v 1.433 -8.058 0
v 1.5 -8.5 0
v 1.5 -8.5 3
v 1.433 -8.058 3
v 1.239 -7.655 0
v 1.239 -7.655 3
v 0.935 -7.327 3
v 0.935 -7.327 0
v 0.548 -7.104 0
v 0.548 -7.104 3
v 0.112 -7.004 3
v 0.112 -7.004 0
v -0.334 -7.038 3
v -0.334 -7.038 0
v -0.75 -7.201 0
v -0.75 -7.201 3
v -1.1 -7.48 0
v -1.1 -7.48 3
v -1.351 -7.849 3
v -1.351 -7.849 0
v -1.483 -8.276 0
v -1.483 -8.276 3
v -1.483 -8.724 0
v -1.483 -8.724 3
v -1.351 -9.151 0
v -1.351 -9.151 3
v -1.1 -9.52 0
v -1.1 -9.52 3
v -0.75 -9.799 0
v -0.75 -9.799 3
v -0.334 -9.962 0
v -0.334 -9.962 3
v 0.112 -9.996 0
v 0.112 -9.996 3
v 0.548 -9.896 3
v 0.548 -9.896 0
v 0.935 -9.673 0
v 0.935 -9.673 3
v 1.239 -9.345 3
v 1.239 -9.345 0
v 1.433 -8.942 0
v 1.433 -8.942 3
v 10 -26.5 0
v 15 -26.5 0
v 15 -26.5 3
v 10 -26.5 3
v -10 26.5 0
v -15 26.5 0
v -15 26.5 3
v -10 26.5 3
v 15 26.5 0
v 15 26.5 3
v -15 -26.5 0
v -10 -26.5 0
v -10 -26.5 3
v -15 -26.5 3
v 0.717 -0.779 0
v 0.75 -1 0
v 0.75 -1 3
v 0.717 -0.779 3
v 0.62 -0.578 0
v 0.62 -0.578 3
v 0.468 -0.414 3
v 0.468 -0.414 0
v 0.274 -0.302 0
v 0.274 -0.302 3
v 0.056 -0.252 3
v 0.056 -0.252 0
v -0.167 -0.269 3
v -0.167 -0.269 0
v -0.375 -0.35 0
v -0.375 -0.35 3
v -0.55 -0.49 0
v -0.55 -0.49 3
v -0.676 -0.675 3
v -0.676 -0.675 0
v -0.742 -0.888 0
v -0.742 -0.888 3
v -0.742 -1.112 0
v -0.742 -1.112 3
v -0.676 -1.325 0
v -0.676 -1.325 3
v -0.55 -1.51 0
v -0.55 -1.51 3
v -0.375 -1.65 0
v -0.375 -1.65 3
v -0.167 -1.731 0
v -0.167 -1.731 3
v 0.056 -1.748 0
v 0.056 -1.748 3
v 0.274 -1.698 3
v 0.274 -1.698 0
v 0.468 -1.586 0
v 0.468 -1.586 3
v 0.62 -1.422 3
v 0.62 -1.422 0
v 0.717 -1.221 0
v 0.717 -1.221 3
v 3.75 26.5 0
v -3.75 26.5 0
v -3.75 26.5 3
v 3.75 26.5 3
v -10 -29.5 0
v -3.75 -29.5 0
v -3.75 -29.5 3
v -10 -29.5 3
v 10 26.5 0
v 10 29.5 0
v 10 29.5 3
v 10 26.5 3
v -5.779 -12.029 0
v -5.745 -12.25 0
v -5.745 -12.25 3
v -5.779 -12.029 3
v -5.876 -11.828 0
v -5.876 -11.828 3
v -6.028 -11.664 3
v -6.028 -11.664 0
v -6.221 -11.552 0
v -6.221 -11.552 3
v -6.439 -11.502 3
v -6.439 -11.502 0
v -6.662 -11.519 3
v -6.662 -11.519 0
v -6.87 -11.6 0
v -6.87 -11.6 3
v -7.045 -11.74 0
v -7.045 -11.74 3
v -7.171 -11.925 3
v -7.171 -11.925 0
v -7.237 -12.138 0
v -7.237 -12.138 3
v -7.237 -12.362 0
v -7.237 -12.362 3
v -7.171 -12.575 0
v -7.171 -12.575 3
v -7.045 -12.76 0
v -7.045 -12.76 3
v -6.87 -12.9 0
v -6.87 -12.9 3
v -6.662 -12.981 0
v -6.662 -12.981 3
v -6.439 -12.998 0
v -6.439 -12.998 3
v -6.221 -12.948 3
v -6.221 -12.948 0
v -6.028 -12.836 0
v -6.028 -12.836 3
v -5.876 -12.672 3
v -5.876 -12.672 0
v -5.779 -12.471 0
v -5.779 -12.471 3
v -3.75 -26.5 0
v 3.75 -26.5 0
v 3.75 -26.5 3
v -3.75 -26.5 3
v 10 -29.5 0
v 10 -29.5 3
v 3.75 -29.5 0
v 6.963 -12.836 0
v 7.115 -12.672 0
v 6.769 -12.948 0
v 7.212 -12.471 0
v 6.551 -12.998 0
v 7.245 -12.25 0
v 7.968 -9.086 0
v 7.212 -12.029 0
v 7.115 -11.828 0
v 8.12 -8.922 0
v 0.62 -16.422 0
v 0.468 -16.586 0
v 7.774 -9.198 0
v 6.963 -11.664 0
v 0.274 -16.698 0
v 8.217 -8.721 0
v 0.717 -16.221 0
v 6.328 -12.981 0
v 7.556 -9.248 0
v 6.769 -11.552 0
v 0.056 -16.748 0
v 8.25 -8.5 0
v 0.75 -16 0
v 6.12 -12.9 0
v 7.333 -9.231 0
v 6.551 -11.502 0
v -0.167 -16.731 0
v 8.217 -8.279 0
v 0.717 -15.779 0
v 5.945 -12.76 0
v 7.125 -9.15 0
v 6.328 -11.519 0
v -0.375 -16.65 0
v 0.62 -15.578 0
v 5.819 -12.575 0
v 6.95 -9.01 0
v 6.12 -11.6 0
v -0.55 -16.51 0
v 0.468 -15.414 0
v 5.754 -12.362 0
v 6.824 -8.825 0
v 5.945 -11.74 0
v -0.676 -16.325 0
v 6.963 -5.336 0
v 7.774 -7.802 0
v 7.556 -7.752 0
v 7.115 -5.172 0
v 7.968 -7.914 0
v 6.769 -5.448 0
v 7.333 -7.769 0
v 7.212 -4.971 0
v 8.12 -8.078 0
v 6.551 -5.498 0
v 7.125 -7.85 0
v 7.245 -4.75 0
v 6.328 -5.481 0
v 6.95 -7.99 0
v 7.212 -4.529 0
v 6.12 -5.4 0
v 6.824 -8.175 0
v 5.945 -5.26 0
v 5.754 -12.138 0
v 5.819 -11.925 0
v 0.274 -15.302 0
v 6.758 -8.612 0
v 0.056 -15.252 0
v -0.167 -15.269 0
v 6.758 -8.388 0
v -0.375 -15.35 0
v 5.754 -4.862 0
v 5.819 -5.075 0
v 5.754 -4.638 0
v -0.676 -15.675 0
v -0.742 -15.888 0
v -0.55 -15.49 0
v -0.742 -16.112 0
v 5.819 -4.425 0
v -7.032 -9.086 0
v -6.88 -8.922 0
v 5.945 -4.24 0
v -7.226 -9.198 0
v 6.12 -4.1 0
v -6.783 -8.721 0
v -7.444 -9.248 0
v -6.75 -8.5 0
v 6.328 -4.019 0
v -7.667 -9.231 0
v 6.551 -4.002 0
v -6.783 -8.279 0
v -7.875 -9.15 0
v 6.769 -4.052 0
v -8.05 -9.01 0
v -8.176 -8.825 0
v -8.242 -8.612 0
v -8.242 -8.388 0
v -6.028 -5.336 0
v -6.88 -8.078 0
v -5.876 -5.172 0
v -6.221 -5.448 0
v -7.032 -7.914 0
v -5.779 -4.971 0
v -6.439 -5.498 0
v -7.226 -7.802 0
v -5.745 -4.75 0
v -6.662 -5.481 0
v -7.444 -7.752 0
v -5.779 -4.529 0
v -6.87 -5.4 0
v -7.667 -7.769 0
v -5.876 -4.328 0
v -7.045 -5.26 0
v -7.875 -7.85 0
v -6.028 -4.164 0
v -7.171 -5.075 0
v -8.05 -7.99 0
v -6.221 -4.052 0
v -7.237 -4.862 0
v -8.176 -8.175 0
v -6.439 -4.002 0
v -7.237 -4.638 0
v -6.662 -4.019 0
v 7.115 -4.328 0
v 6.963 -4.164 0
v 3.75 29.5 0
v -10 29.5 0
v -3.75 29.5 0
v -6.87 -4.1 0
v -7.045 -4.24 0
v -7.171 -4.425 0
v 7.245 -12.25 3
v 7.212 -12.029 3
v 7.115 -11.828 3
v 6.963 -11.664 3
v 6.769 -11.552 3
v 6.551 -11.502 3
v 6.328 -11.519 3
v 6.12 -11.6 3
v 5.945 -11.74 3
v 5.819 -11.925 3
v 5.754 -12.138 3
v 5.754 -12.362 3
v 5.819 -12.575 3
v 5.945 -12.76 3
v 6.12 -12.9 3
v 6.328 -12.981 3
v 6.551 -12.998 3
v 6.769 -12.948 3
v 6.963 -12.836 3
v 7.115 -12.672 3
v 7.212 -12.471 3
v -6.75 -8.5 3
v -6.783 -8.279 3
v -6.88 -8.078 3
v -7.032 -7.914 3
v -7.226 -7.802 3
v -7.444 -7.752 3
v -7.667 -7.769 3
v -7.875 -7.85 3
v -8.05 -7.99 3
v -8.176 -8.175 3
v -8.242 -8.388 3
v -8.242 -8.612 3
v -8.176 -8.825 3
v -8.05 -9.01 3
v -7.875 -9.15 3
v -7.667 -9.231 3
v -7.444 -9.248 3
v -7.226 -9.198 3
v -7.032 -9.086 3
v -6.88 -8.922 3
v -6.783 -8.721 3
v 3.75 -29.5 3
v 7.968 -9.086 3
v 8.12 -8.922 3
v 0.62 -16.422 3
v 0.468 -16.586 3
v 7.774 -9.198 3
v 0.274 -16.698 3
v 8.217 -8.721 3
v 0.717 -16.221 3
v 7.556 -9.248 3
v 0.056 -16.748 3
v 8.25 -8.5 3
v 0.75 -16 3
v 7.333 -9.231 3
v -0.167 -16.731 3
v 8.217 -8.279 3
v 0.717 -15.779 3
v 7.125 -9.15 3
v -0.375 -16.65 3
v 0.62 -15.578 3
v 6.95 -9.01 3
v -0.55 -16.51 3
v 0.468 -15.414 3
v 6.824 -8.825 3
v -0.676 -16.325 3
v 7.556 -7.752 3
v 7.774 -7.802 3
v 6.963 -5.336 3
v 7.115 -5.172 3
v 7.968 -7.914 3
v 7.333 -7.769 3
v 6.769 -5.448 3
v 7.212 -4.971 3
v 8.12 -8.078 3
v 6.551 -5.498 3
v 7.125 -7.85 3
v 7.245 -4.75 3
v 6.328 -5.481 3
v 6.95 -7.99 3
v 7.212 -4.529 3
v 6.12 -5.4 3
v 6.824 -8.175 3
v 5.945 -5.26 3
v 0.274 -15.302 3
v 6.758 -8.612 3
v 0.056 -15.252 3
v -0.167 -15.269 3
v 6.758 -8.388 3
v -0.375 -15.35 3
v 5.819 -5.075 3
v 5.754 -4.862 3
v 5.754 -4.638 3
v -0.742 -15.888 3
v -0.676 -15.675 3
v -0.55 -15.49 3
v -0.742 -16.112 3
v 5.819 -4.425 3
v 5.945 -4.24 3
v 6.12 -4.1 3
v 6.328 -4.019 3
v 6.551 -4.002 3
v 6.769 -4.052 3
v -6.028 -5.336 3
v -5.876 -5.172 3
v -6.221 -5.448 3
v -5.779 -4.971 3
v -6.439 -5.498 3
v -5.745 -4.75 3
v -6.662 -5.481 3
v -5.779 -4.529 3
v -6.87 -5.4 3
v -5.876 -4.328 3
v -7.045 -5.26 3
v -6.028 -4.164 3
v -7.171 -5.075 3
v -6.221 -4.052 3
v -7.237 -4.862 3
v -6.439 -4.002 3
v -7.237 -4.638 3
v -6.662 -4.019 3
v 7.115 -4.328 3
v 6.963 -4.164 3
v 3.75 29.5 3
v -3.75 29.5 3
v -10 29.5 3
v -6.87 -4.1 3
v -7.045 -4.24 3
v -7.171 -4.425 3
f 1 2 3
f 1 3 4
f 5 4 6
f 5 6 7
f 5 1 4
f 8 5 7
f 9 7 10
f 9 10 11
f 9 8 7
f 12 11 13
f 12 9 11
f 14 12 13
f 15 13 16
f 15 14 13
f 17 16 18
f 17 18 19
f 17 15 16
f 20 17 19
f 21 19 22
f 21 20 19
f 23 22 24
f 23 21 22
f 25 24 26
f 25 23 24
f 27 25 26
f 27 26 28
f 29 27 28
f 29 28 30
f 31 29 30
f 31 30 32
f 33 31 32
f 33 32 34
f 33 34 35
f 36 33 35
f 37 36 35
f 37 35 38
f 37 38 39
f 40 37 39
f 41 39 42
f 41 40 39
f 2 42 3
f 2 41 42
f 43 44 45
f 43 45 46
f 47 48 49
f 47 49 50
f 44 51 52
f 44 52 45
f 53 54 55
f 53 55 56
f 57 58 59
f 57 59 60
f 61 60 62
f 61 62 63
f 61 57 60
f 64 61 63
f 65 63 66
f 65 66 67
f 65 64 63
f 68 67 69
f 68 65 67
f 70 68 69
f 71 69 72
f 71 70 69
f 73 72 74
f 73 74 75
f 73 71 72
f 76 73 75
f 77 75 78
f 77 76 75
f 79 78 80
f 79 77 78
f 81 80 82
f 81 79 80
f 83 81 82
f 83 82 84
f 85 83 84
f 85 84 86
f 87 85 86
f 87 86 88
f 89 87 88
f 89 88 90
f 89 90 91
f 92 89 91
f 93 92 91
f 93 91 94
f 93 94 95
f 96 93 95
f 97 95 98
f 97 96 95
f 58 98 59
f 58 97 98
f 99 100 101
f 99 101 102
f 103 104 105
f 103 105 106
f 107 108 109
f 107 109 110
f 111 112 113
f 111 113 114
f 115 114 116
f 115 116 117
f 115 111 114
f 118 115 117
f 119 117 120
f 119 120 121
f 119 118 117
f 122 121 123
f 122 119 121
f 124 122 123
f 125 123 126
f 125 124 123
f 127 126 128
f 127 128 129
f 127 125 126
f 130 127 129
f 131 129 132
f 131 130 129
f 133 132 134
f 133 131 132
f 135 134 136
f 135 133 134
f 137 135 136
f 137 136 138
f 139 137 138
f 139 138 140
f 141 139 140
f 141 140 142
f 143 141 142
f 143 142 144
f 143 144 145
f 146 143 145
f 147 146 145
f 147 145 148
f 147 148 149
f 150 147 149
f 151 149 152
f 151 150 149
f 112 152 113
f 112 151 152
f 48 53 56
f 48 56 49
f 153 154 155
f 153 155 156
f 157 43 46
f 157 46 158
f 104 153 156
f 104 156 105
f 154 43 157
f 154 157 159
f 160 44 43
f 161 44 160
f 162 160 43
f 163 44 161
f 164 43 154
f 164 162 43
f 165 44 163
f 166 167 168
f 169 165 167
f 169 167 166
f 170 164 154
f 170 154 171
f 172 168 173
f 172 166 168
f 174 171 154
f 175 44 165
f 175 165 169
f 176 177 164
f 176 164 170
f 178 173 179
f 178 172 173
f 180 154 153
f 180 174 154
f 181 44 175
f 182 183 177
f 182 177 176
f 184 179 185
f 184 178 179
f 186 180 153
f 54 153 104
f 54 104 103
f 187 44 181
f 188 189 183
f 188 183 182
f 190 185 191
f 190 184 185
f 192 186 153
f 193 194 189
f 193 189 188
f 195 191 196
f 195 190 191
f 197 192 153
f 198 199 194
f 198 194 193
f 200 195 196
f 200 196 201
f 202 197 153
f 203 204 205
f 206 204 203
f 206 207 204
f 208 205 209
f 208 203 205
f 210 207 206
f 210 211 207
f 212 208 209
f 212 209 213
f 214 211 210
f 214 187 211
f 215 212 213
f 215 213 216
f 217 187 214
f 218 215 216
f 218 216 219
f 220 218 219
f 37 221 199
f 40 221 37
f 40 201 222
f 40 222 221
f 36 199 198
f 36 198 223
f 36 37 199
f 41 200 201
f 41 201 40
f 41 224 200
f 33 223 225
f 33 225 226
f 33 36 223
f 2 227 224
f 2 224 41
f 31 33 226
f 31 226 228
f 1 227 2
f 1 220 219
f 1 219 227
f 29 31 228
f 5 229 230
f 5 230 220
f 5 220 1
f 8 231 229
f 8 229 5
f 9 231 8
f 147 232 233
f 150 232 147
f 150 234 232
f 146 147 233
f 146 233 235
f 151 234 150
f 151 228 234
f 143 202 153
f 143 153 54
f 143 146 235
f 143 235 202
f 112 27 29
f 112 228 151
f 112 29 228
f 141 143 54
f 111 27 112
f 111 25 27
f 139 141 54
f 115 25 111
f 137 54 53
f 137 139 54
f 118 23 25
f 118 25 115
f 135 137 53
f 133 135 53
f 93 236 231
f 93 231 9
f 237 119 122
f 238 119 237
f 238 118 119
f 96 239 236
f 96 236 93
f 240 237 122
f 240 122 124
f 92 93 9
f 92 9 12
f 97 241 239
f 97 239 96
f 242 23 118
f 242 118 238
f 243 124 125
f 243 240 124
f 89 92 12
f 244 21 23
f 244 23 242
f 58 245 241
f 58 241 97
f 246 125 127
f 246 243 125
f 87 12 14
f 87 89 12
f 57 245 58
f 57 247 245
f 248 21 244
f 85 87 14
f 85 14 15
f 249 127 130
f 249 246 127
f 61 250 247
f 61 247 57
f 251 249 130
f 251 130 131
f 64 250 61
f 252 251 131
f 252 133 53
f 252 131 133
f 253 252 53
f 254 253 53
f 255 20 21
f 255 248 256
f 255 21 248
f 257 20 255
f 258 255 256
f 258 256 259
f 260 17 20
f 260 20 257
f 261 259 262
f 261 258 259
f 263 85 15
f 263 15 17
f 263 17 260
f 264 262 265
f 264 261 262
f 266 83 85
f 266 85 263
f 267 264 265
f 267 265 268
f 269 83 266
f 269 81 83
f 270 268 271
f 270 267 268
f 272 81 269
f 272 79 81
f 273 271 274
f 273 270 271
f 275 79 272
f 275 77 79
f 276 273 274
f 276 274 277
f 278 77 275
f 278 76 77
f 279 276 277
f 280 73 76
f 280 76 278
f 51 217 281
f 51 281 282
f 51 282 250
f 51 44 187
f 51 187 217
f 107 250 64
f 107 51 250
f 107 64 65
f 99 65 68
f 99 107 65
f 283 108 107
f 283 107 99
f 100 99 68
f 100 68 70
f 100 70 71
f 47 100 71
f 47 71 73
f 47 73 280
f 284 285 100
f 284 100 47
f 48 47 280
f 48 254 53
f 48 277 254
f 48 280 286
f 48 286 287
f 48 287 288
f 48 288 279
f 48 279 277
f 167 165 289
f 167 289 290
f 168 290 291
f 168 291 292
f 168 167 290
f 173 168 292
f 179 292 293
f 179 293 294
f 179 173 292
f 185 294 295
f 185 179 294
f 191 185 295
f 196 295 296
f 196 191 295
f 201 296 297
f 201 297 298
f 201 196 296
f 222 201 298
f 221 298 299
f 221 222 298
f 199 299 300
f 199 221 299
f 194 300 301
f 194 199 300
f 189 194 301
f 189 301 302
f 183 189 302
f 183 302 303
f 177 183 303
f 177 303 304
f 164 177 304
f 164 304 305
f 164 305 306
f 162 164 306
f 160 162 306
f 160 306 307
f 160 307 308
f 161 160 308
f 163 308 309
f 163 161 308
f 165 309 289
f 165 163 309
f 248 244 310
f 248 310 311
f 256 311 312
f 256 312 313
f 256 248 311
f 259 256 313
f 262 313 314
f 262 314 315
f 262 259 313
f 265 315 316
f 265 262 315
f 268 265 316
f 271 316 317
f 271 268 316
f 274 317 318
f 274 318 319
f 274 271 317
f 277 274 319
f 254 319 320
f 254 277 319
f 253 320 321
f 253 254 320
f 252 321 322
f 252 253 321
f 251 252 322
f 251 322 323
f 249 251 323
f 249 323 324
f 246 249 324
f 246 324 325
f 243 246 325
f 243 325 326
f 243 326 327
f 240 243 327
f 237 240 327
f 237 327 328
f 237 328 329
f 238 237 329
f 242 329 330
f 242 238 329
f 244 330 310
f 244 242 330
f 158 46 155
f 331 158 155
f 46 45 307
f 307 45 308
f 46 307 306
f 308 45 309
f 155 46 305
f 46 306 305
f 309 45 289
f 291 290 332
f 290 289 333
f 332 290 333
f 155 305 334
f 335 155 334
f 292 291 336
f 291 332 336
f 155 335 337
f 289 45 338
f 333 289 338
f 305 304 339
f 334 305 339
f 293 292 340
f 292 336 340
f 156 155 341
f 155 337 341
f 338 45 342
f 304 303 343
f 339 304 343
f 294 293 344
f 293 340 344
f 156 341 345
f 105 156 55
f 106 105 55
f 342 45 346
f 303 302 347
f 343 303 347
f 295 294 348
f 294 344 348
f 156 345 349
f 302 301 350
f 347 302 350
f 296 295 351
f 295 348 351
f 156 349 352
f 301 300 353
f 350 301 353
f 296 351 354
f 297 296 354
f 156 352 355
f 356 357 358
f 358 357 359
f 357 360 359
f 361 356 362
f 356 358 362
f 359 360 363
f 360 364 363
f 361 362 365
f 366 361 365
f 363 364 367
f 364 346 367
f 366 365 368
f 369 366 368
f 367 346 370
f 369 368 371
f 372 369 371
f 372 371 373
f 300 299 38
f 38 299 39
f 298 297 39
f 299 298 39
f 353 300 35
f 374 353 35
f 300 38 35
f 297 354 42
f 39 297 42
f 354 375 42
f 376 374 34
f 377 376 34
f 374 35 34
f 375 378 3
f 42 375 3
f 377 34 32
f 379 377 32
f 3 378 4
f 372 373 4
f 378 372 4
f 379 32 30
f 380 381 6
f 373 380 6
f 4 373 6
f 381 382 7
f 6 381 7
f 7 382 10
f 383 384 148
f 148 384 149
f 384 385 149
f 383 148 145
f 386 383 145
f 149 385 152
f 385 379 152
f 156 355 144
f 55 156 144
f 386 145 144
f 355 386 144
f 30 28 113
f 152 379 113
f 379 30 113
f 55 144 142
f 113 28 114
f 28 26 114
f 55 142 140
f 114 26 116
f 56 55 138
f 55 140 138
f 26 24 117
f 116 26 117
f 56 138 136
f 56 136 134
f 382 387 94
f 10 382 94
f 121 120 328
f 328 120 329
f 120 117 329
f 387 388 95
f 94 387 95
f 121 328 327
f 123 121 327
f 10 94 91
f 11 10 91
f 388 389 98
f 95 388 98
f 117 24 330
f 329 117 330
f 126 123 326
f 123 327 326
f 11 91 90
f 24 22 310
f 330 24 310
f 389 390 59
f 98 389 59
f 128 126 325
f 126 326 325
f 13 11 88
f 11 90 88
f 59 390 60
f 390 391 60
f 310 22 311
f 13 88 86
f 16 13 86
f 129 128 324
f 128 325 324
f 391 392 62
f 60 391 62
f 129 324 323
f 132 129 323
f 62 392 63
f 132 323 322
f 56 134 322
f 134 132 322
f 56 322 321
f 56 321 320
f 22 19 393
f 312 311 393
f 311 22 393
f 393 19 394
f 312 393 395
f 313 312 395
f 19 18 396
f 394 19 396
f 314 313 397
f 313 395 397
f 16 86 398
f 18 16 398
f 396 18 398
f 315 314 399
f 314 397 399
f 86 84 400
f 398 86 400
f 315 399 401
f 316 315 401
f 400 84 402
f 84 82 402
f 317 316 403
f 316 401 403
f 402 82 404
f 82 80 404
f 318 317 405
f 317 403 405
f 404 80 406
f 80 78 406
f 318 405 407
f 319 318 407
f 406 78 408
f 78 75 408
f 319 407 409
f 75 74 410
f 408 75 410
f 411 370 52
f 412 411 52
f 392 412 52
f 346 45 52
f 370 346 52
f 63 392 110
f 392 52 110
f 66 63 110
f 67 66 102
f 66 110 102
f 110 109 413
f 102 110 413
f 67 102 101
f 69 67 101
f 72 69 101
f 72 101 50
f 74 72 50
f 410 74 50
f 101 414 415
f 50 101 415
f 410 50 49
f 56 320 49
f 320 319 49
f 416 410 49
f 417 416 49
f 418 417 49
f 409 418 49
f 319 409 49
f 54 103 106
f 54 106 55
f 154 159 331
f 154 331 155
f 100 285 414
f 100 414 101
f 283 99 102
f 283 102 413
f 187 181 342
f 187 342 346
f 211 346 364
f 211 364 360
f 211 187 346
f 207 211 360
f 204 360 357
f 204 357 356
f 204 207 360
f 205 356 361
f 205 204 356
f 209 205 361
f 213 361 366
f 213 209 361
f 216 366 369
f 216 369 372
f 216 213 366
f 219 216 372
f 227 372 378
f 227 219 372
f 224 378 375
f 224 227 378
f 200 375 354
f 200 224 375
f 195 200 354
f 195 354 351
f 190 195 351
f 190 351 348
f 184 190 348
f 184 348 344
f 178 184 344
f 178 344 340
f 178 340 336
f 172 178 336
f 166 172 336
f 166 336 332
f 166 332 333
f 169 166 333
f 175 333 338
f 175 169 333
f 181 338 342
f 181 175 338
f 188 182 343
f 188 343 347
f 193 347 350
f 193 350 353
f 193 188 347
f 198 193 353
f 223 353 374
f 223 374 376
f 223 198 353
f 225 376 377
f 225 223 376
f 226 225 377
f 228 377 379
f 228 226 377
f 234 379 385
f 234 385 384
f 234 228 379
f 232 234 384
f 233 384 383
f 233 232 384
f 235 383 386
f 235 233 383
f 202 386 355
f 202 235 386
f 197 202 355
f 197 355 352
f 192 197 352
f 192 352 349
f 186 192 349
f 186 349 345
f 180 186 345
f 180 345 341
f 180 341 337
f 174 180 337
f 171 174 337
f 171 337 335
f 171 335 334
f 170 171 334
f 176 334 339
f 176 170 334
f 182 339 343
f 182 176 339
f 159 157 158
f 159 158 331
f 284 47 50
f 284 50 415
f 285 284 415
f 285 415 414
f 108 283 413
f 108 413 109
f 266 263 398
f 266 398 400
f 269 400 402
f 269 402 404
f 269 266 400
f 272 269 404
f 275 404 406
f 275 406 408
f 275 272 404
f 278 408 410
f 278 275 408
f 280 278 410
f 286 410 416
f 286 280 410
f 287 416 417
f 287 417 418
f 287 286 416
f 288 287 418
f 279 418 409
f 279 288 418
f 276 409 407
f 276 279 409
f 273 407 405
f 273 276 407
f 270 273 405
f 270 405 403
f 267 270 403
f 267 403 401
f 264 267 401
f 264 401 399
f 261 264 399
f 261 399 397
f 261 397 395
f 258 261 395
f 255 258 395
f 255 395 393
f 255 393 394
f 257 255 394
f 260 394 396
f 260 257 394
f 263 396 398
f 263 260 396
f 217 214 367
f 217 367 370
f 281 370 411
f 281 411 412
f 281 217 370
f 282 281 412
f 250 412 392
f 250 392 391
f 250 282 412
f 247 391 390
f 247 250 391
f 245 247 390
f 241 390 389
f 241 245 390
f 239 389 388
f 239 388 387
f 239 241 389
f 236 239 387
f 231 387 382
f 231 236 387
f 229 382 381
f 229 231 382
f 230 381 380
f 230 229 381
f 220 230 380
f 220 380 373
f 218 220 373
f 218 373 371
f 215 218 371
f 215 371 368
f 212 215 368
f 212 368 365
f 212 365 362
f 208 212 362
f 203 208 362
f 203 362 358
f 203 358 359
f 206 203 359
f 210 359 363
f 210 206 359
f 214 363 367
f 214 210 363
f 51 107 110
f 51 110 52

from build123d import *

# Parameters (mm, degrees)
SKETCH1_R           = 0.75
SKETCH1_R_2         = 1.5
BOSS_EXTRUDE1_DEPTH = 3


with BuildPart() as part:
    # Sketch1 → Boss-Extrude1 (new body)
    with BuildSketch(Plane.XY):
        Polygon((-15, 26.5), (-10, 26.5), (-10, 29.5), (-3.75, 29.5), (-3.75, 26.5), (3.75, 26.5), (3.75, 29.5), (10, 29.5), (10, 26.5), (15, 26.5), (15, -26.5), (10, -26.5), (10, -29.5), (3.75, -29.5), (3.75, -26.5), (-3.75, -26.5), (-3.75, -29.5), (-10, -29.5), (-10, -26.5), (-15, -26.5), align=None)
        with Locations((0, -1)):
            Circle(SKETCH1_R, mode=Mode.SUBTRACT)
        with Locations((6.495190528, -4.75)):
            Circle(SKETCH1_R, mode=Mode.SUBTRACT)
        with Locations((6.495190528, -12.25)):
            Circle(SKETCH1_R, mode=Mode.SUBTRACT)
        with Locations((0, -16)):
            Circle(SKETCH1_R, mode=Mode.SUBTRACT)
        with Locations((-6.495190528, -12.25)):
            Circle(SKETCH1_R, mode=Mode.SUBTRACT)
        with Locations((-6.495190528, -4.75)):
            Circle(SKETCH1_R, mode=Mode.SUBTRACT)
        with Locations((0, -8.5)):
            Circle(SKETCH1_R_2, mode=Mode.SUBTRACT)
        with Locations((-7.5, -8.5)):
            Circle(SKETCH1_R, mode=Mode.SUBTRACT)
        with Locations((7.5, -8.5)):
            Circle(SKETCH1_R, mode=Mode.SUBTRACT)
    extrude(amount=BOSS_EXTRUDE1_DEPTH)


solid = part.part
